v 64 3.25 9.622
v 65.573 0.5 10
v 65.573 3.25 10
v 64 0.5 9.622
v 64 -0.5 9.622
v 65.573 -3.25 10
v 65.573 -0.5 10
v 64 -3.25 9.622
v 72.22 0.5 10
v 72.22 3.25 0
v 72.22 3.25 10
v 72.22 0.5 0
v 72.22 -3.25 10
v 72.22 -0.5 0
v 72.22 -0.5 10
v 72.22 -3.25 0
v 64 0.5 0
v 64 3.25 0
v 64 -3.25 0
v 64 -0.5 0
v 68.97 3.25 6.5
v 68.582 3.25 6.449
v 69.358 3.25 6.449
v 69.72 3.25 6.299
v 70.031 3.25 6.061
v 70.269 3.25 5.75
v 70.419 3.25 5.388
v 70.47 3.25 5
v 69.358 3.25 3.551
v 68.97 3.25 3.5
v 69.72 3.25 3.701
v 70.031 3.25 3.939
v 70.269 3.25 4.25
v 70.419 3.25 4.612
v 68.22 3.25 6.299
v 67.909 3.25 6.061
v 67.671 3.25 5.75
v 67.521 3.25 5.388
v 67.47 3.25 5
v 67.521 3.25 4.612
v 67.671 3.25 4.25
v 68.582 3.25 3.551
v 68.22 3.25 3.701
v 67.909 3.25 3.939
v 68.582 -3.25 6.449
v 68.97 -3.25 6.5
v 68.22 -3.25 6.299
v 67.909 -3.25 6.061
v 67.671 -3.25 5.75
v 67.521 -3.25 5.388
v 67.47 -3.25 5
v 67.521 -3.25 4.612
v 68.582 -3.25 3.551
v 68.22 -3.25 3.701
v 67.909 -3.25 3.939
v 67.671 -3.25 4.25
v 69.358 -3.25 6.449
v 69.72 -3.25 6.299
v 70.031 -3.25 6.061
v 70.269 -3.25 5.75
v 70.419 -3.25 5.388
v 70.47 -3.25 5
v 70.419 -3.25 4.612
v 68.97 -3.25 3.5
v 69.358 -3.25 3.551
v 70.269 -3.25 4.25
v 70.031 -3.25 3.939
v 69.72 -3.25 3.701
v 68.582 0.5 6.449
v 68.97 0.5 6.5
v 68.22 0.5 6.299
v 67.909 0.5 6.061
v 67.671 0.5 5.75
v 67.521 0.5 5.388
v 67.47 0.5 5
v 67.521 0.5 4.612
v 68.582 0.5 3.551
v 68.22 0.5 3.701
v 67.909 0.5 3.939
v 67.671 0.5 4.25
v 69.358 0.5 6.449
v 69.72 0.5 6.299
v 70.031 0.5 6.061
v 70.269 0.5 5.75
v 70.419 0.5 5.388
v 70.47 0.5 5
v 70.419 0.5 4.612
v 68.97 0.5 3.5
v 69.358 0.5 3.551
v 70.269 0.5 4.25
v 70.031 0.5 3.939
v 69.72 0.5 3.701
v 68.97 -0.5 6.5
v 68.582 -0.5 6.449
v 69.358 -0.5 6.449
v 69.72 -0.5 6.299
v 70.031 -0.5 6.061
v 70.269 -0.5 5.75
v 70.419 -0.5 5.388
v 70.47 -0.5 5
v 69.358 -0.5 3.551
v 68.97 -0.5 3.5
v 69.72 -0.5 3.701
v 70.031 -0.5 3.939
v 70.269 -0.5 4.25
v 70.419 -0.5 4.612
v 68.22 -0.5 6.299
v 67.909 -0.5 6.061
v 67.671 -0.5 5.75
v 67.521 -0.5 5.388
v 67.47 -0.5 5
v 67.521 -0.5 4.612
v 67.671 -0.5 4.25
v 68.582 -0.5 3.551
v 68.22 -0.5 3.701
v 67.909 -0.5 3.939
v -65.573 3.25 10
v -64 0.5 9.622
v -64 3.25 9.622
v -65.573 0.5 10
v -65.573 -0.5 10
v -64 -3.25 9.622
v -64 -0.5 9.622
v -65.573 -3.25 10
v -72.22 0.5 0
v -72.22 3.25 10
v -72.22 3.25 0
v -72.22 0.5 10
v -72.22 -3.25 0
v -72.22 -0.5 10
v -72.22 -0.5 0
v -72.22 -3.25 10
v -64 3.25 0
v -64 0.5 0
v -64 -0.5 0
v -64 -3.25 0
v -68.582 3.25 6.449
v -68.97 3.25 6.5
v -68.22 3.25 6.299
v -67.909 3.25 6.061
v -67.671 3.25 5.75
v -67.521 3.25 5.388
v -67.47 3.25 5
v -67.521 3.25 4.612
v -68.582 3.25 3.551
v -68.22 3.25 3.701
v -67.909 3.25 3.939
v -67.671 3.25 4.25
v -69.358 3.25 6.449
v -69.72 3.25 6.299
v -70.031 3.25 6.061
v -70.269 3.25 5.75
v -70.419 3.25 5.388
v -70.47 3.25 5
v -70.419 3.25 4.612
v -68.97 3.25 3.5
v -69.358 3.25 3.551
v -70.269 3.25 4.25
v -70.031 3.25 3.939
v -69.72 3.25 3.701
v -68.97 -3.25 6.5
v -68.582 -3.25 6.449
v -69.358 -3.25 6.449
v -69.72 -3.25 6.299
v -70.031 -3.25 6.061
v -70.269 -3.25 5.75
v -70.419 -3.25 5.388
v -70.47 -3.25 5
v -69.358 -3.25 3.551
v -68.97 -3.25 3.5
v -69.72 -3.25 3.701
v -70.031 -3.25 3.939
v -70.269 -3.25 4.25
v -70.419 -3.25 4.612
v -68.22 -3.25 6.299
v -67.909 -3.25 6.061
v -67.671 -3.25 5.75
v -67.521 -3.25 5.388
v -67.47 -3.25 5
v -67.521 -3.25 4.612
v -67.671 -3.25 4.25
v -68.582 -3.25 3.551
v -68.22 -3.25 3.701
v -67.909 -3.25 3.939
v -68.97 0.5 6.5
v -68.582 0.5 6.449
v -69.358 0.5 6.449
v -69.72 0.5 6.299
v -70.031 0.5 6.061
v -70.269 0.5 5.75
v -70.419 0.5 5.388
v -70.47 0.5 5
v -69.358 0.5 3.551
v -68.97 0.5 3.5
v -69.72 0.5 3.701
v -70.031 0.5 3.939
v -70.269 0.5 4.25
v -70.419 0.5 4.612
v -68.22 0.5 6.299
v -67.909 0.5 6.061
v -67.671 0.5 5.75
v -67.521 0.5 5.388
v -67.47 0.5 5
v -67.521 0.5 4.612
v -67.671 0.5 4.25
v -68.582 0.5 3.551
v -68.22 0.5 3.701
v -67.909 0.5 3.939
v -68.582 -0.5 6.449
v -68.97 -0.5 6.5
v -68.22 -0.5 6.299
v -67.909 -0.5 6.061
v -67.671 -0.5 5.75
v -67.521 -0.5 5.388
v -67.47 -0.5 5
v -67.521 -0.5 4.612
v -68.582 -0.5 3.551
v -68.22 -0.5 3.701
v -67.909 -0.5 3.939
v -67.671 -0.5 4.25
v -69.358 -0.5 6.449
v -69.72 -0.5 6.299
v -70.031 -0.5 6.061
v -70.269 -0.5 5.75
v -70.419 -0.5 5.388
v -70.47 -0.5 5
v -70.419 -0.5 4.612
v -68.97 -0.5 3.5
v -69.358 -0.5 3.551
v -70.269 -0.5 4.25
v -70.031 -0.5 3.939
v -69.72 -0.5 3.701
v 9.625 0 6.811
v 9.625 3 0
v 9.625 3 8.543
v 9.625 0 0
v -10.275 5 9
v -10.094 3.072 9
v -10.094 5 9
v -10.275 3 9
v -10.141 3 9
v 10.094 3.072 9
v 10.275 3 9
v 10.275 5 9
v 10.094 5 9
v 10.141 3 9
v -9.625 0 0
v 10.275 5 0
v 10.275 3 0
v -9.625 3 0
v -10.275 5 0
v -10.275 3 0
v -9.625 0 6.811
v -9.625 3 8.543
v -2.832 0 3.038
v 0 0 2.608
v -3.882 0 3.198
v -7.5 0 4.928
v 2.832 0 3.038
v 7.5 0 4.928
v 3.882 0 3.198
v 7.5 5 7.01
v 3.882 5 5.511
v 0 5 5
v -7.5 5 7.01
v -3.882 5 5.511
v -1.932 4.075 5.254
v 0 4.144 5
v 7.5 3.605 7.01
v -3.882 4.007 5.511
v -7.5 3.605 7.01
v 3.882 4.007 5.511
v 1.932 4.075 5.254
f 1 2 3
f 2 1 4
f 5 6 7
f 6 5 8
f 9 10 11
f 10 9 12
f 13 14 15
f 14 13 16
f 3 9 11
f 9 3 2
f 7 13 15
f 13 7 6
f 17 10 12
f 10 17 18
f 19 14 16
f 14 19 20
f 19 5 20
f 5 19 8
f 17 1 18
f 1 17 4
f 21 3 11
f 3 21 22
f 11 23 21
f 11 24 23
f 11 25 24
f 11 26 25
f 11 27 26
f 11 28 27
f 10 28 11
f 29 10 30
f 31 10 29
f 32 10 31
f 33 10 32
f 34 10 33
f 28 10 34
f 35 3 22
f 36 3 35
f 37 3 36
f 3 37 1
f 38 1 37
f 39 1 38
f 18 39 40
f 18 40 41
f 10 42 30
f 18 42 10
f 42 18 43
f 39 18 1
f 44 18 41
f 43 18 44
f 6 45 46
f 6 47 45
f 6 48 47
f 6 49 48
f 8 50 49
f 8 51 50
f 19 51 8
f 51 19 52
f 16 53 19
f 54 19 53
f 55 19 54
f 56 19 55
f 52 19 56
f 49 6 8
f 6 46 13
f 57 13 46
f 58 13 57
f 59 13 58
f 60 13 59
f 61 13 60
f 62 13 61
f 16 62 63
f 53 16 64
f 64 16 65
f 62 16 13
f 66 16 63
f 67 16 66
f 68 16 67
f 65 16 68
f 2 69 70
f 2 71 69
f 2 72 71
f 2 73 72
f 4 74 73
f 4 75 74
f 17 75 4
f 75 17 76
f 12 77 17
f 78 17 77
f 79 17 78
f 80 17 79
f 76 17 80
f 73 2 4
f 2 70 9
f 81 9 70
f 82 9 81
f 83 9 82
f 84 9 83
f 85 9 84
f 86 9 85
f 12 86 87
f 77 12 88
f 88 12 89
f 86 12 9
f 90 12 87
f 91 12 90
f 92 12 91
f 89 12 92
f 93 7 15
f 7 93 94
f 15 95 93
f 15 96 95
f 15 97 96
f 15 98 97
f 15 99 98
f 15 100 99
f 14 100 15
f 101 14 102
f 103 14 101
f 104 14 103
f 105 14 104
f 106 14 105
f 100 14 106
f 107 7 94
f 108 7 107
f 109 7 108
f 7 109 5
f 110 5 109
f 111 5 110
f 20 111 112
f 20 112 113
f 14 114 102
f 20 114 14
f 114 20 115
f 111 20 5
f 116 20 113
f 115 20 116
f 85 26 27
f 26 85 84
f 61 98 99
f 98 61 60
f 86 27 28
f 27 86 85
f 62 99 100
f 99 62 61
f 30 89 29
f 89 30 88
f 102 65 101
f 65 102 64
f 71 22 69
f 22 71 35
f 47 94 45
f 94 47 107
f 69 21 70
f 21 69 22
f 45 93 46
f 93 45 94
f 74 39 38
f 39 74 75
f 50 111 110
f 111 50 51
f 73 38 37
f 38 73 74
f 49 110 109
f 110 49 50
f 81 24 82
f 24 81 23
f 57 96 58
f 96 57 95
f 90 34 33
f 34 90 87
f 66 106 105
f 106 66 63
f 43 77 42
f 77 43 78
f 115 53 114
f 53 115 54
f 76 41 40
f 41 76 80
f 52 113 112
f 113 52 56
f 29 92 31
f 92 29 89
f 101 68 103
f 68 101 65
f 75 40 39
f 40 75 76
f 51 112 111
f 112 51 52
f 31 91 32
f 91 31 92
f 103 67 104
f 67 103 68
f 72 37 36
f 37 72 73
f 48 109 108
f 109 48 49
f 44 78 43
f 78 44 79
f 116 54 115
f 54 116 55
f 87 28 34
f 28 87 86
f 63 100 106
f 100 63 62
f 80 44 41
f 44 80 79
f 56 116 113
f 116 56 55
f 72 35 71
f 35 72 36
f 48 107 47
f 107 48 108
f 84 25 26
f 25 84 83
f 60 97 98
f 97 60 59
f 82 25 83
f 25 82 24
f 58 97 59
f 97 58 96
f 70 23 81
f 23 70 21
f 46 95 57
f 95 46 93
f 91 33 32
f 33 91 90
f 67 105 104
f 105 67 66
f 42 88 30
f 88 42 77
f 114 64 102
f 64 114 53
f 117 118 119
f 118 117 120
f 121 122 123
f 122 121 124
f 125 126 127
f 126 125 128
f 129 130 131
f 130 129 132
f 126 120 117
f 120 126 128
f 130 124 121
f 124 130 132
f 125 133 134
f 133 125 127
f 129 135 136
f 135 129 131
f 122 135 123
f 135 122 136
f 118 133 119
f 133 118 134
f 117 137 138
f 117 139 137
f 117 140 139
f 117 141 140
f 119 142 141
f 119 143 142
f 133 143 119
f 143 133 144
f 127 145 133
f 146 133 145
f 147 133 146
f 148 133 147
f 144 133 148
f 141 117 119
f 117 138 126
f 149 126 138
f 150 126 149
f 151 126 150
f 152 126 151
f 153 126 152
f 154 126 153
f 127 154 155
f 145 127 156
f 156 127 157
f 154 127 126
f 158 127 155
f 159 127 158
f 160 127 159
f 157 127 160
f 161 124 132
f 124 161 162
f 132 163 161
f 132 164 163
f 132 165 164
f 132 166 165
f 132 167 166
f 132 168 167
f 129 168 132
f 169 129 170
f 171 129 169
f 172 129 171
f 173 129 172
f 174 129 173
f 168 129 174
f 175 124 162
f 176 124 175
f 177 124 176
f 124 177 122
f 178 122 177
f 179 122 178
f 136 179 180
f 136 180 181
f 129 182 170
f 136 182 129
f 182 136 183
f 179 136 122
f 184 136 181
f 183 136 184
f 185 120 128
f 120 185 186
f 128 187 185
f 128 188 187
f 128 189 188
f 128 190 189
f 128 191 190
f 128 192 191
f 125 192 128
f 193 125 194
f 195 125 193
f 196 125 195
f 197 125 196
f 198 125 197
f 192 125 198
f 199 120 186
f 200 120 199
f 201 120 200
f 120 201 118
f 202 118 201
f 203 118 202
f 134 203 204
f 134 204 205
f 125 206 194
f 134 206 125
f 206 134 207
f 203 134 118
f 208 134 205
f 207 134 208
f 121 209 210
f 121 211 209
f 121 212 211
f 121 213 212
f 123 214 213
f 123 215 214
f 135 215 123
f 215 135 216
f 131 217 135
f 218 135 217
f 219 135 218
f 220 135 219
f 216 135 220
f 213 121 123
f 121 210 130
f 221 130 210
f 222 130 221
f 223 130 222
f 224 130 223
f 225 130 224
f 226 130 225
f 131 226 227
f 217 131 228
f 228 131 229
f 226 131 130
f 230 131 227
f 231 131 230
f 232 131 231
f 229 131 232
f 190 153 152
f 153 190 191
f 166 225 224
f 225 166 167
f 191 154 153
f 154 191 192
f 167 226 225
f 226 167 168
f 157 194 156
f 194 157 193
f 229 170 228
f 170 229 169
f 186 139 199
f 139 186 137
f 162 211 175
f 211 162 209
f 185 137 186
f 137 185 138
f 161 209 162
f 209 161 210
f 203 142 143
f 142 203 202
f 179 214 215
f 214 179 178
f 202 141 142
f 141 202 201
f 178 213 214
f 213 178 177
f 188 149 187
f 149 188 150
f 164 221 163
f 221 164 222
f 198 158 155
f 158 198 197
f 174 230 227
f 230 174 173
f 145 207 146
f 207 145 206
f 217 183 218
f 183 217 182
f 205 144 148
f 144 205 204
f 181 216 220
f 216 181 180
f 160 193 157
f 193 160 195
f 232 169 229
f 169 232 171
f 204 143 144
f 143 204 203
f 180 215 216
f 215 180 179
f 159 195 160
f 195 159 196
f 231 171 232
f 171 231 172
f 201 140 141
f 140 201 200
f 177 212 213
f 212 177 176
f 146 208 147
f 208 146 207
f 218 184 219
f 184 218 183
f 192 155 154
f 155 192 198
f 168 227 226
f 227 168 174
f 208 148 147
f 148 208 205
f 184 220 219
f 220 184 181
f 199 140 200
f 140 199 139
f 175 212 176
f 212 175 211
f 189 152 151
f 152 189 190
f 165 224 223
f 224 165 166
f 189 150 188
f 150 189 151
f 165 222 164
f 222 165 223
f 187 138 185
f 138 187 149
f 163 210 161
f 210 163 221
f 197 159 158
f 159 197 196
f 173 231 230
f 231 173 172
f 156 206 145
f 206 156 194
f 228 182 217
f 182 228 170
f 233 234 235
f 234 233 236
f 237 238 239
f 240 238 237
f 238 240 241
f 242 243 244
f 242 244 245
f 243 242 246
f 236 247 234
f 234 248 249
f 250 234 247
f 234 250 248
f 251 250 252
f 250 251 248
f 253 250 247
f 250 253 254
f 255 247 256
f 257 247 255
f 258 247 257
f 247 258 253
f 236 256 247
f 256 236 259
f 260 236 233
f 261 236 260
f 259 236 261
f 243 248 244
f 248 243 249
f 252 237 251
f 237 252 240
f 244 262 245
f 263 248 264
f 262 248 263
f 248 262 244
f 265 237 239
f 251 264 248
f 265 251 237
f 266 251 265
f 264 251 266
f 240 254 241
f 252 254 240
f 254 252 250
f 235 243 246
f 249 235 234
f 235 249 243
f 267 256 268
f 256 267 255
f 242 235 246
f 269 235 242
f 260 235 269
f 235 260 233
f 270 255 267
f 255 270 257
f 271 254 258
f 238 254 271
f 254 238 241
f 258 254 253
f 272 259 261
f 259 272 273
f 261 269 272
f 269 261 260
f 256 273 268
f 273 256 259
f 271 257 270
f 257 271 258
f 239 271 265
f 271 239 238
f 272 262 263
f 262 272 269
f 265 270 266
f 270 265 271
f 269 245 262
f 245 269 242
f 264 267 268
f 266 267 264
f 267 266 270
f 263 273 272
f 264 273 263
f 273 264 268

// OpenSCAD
// Parameters that will be overwritten by command-line arguments
front_view = "default_front.dxf";  // Default DXF for front view
top_view = "default_top.dxf";      // Default DXF for top view
bridge_length = 20;                // Default bridge length

lensWidth = 54;
lensHeight = 36;

parameter_a = 1.5;
parameter_b = 1.5;
parameter_c = -11.95;
parameter_d = 0.22;

parameter_e = 9;
parameter_f = 47;
parameter_g = bridge_length;  // Use the user-defined bridge length
parameter_h = 1.3;

parameter_i = 100;

// Right lens
module lens() {
	intersection() {
		linear_extrude(height=15)
			import(front_view,$fn=250);
		translate([0,20,0])
			rotate( [90,0,0] )
				linear_extrude(height=50)
					import(top_view,$fn=250);
	}
}

module lens_case() {
  translate([lensWidth/2, (lensHeight+parameter_a*2)/lensHeight * -(parameter_c + lensHeight/2), 0])
    difference() {
      union() {
        linear_extrude(height = 20)
          scale([(lensWidth+parameter_a*2)/lensWidth,(lensHeight+parameter_a*2)/lensHeight])
            translate([-lensWidth/2, parameter_c + lensHeight/2, 0])
              import(front_view,$fn=250);
      }
      translate([0, 0, -1])
        linear_extrude(height=100)
          scale([(lensWidth-parameter_b*2)/lensWidth,(lensHeight-parameter_b*2)/lensHeight])
            translate([-lensWidth/2, parameter_c + lensHeight/2, 0])
              import(front_view,$fn=250);	
    }
}

module lens_assembly() {
  intersection() {
    difference() {
      union() {
        lens_case();
        translate([lensWidth, -6.5/2, 0])
          cube([parameter_a + parameter_d + 6.5, 6.5, 10]);
      }

      translate([0, 0, 1.5])
        scale([1, 1, 1.2])
          lens();

      translate([lensWidth/2, -1/2, -1])
        cube([lensWidth, 1, 10 + 2]);

      translate([lensWidth + parameter_a + parameter_d + 6.5/2, 0, 5])
        rotate([90, 0, 0])
          cylinder(d = 3, h = 25, $fn = 24, center = true);

      intersection() {
        translate([(lensWidth - parameter_e + parameter_a + parameter_d)/2 + parameter_e, 20, 10 + sqrt(pow(parameter_i, 2) - pow((lensWidth - parameter_e + parameter_a + parameter_d)/2, 2))])
          rotate([90, 0, 0])
            cylinder(r = parameter_i, h = 100, $fn=120);

        translate([parameter_e, -50, 0])
          cube([lensWidth - parameter_e + parameter_a + parameter_d, 100, 100]);
      }
    }

    union() {
      translate([-10, -10 + 2, -30/2 + 10 + 5])
        rotate([0, 90, 0])
          cylinder(d = 30, h = 20);
      translate([-10, -50, 0])
        cube([100, 100, 10]);
    }
  }
}

module bridge() {
	difference() {
		union() {
			translate([0,4,9/2])
				cube([bridge_length - parameter_a/2, 4, 9],center=true);
			translate([0,6,9/2])
				cube([bridge_length - parameter_a/2 + parameter_h, 2, 9],center=true);
		}

		union() {
			translate([0,-10,15-2])
				rotate([-60,0,0])
					cylinder(r=15,h=20,$fn=24);

			translate([0,15,22-2])
				rotate([90,0,0])
					cylinder(r=15,h=20,$fn=24);
		}
	}
}

difference() {
	// Raw Frames
	union() {
    for (m = [0, 1])
      mirror([m, 0, 0])
        translate([bridge_length/2,0,0])
          lens_assembly();

		// Bridge
    translate([0, -2, 0])
      bridge();
	}
}
